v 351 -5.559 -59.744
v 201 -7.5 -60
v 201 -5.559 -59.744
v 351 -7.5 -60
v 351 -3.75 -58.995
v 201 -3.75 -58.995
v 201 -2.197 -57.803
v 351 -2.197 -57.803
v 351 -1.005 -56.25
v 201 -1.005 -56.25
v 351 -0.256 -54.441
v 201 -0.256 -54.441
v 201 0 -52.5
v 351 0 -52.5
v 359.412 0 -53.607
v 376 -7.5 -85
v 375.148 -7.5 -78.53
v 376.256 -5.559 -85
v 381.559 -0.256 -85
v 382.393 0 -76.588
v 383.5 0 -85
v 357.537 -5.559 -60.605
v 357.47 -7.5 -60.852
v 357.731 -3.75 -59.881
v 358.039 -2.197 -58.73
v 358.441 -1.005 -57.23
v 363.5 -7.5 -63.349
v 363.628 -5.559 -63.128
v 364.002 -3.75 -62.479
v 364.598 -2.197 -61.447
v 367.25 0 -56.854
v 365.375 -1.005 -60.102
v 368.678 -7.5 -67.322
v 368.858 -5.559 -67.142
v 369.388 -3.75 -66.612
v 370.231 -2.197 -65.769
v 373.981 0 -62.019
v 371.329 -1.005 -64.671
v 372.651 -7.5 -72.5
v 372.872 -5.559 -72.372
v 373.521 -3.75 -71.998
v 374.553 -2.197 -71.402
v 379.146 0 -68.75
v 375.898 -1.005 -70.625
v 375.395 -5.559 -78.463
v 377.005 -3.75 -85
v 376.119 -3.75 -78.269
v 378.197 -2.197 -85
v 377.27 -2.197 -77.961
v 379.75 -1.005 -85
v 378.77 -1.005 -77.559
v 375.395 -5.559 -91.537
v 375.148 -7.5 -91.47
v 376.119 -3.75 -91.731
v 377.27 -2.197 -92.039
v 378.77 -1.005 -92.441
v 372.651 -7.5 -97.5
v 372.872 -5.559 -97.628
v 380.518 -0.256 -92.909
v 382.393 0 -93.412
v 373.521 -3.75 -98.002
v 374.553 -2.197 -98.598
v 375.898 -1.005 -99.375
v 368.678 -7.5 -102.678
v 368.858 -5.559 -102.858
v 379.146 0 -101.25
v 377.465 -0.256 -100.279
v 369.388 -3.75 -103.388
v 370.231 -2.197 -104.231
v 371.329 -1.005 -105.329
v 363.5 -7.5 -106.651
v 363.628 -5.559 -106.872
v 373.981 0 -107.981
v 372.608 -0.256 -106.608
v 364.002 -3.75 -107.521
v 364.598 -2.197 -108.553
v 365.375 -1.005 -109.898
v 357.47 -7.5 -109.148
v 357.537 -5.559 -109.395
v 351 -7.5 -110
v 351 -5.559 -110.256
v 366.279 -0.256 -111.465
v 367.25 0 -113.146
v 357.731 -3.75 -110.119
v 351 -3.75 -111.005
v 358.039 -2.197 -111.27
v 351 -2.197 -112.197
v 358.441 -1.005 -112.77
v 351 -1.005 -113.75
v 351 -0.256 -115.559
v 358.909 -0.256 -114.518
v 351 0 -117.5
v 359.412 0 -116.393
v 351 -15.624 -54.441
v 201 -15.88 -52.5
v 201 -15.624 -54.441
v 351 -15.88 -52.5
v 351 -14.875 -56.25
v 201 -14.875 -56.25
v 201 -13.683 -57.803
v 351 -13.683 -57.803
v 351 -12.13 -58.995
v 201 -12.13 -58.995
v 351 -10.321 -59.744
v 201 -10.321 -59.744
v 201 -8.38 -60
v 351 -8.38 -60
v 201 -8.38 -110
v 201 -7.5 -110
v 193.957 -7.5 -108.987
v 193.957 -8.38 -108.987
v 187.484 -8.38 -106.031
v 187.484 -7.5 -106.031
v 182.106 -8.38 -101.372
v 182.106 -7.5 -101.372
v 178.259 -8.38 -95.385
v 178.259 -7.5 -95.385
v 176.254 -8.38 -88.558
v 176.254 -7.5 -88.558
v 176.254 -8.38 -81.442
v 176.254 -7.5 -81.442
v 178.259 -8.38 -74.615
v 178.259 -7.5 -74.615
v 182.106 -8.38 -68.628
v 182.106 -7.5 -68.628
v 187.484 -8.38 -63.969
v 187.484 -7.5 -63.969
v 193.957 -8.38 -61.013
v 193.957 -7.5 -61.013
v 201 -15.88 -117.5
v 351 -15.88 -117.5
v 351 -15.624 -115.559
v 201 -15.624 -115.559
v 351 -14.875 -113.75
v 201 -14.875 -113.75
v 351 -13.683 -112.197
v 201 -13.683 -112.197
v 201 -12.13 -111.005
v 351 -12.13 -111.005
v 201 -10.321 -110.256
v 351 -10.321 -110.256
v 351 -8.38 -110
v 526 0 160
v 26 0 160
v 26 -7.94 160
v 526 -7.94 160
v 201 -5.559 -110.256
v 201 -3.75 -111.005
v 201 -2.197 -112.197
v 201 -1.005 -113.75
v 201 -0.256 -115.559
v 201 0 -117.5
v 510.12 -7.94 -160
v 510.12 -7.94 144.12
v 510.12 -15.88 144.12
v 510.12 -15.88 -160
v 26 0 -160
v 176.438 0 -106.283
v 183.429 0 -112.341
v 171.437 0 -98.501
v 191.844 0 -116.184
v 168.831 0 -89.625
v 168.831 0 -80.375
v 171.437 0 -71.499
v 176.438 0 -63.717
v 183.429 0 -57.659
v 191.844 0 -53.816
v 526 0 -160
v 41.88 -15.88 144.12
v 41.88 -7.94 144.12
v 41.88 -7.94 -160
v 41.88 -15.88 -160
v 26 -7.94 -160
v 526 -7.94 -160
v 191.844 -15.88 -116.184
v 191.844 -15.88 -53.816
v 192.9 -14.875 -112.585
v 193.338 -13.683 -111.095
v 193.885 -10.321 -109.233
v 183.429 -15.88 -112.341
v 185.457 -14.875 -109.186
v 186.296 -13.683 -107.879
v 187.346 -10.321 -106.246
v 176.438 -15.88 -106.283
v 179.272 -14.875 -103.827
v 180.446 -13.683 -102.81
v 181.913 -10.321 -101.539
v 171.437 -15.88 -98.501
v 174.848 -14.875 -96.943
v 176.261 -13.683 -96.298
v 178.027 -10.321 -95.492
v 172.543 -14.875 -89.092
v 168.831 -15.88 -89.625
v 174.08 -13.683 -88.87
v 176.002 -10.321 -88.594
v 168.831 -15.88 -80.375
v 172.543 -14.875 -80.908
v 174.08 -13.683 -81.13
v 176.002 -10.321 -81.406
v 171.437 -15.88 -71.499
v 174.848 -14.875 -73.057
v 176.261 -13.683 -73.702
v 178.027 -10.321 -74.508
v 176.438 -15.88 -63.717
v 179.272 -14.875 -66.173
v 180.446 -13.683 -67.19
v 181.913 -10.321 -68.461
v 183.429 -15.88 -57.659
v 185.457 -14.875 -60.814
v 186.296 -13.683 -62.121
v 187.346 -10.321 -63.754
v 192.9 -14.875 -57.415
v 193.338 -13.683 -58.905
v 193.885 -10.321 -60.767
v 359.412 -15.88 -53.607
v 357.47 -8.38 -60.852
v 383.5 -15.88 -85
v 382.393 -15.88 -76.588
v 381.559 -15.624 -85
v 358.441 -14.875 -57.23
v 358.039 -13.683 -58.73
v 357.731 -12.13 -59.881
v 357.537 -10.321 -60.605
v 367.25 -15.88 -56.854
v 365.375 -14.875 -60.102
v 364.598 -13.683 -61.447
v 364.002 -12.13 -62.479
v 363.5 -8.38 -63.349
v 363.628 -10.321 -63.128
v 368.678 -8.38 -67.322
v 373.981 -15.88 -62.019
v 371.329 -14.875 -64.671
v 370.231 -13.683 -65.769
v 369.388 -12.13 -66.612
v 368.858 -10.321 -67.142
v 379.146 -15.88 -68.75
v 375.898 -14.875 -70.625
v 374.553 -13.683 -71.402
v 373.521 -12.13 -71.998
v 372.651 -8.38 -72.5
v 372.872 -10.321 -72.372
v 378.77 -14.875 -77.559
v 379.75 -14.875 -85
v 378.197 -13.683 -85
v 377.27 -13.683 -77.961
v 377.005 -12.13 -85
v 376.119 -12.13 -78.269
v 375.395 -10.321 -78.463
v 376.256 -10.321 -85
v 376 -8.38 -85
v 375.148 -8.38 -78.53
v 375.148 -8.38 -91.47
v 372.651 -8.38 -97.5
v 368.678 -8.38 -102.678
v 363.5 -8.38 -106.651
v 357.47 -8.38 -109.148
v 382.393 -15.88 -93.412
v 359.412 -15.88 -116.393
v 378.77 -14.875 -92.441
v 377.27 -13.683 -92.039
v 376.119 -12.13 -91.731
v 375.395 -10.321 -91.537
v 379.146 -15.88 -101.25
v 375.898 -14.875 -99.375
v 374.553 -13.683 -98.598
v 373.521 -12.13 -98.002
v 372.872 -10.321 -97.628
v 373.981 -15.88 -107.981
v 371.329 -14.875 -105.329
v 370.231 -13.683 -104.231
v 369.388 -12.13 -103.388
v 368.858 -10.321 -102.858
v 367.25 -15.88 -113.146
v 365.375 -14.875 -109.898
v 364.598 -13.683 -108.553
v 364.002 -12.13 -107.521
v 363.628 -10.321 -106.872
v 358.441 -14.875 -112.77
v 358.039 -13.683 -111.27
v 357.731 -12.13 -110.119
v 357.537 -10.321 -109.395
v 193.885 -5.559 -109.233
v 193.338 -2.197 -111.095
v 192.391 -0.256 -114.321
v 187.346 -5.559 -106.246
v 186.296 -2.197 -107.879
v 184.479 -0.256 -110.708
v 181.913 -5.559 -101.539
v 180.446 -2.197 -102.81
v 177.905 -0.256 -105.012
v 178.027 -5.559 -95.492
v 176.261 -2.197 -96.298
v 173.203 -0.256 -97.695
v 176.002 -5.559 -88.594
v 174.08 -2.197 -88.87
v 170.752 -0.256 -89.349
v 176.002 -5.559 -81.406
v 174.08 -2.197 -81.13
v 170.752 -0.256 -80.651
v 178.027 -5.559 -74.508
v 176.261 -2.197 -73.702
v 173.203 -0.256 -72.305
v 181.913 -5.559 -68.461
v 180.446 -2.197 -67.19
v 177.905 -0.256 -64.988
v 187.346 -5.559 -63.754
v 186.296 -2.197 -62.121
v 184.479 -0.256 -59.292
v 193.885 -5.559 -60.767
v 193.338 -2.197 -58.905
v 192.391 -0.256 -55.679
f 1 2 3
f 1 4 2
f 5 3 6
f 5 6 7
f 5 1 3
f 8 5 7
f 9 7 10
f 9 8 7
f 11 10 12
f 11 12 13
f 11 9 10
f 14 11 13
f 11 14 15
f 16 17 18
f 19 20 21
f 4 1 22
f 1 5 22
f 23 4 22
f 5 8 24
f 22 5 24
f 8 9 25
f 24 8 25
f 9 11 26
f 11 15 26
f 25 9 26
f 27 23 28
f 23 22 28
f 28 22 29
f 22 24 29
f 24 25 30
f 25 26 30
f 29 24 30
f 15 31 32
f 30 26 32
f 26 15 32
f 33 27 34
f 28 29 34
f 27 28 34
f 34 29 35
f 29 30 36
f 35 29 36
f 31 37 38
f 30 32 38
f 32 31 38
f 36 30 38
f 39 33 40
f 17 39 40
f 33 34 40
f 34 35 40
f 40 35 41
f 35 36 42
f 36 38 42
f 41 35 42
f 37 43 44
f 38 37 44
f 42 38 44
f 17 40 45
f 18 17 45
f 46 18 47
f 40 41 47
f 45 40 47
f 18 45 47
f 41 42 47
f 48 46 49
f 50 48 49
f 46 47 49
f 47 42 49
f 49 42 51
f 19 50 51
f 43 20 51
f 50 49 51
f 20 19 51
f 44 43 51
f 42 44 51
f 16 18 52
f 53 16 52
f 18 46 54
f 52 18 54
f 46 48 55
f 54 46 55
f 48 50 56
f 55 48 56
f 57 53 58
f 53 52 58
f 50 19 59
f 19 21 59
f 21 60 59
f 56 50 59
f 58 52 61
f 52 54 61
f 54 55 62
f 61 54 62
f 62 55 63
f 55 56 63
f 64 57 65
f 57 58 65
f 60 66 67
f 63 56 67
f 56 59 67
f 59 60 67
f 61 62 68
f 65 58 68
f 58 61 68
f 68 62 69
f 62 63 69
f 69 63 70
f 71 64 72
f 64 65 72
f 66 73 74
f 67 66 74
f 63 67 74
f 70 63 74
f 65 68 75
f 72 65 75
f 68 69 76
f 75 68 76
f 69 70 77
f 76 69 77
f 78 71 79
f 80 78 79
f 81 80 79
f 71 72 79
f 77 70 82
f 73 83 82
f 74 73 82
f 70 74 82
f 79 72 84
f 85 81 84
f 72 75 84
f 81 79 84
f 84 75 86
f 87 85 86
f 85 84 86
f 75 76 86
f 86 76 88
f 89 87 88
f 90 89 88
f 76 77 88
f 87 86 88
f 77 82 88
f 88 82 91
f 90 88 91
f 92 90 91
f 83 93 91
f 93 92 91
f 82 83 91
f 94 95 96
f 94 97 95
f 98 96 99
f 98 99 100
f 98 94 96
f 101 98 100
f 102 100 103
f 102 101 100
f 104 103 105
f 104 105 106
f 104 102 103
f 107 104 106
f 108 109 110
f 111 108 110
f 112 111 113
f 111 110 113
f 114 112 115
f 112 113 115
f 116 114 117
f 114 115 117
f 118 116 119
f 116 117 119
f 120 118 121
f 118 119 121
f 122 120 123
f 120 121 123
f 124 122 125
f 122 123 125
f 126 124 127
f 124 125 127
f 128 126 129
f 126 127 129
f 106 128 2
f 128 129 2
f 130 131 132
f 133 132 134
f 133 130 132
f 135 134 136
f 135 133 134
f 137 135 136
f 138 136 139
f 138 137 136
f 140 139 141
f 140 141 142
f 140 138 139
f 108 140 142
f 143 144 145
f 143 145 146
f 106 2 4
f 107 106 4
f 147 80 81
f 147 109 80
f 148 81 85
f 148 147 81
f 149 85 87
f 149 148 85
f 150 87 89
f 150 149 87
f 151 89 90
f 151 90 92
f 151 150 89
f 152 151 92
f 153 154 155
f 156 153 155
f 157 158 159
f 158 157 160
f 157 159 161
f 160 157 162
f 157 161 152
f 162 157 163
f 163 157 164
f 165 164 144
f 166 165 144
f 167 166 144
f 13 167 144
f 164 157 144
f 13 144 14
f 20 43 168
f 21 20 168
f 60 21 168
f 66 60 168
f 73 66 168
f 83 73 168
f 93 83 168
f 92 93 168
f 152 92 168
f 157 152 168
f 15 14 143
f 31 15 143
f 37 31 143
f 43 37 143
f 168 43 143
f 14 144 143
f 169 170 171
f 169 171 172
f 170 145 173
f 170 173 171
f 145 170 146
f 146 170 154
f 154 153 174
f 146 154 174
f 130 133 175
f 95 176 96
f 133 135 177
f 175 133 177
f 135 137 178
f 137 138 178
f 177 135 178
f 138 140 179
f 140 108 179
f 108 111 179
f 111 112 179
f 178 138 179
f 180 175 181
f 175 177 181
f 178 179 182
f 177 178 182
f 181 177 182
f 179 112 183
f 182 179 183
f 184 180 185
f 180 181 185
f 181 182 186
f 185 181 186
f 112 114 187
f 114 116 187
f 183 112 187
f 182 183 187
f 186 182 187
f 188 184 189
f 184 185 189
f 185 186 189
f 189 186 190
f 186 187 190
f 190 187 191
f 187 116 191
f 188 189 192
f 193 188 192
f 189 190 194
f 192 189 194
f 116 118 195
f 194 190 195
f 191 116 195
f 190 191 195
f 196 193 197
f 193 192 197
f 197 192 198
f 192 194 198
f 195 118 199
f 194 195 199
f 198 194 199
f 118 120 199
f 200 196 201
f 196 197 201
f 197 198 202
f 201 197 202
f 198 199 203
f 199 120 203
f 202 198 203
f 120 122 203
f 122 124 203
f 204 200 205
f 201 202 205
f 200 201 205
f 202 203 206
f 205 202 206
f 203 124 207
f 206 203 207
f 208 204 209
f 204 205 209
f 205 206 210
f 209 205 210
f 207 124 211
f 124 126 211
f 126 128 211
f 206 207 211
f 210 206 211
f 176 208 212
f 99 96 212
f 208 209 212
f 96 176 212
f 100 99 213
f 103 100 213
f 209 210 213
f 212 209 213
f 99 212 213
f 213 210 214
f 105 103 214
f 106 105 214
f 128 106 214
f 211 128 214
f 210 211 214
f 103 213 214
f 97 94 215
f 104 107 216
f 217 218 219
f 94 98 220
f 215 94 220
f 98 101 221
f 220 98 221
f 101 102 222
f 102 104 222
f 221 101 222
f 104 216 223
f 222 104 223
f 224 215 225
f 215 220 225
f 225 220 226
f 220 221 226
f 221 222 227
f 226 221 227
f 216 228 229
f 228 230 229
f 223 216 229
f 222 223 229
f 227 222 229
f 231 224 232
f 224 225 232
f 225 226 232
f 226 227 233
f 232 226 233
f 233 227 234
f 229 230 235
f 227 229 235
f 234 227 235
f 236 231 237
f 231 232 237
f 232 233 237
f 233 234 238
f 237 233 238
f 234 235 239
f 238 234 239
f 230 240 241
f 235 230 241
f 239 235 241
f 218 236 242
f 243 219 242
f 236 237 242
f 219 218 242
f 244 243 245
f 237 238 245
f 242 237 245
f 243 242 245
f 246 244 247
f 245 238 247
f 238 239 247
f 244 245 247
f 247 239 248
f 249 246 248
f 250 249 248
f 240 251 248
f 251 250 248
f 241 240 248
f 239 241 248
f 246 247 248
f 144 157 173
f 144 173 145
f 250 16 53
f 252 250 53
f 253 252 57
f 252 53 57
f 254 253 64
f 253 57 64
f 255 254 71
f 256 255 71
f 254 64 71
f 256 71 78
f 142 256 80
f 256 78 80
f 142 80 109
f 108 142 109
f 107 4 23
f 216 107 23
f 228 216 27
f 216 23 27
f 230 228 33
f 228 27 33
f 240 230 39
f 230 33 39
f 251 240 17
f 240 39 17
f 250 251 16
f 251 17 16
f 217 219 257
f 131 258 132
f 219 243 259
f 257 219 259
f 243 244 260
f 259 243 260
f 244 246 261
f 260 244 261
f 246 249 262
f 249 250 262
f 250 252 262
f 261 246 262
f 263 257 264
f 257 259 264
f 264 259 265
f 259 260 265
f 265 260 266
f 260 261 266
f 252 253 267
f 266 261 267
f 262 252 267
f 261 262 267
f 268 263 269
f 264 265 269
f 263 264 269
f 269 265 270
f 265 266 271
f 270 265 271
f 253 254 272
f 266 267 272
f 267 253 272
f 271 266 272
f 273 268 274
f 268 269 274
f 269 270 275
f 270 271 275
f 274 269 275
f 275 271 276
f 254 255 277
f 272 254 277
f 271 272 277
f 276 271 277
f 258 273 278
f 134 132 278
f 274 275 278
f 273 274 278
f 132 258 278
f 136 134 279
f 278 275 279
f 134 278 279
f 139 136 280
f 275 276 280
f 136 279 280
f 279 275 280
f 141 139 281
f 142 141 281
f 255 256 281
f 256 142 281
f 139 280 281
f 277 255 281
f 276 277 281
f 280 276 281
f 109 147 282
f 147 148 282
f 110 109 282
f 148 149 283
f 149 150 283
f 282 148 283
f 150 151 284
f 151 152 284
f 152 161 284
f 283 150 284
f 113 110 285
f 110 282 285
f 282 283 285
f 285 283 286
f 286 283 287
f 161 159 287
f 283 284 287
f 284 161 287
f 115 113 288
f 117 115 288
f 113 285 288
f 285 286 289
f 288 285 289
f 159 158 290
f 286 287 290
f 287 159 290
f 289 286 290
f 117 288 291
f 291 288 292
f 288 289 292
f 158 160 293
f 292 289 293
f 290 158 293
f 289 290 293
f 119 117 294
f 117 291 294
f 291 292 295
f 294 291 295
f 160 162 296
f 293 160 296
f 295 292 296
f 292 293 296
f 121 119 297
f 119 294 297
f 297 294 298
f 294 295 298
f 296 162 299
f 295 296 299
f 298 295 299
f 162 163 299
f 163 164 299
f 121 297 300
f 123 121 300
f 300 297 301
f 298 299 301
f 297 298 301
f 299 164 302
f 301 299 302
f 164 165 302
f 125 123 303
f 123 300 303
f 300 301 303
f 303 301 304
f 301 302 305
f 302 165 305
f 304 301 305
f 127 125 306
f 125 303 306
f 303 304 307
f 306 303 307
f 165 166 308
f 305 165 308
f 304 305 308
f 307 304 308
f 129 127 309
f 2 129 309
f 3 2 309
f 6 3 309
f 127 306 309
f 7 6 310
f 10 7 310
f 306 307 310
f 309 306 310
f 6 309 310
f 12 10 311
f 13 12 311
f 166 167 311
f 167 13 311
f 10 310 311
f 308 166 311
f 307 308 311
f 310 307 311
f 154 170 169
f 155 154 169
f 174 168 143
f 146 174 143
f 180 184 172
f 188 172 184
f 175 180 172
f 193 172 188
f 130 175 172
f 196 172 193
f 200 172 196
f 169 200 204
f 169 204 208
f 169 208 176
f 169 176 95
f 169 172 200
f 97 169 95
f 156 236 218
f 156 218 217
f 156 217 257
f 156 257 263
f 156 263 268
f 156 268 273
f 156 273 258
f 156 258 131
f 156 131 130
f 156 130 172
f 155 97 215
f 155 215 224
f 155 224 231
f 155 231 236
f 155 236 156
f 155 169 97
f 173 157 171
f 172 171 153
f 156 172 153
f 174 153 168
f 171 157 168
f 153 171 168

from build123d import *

# Parameters (mm, degrees)
F0_W     = 500
F0_H     = 320
F1_DEPTH = 15.88
F2_W     = 15.88
F2_H     = 7.94
F3_DEPTH = 320.001
F4_W     = 7.94
F4_H     = 15.88
F5_DEPTH = 484.121
F6_R     = 7.5


with BuildPart() as f1:
    # F0 (on Front) → F1 (new body)
    with BuildSketch(Plane.XZ):
        with Locations((276.000002, -4e-06)):
            Rectangle(F0_W, F0_H)
        with BuildLine():
            ThreePointArc((376.000002, -85.000004), (368.677672, -102.677673), (351.000002, -110.000004))
            Line((351.000002, -110.000004), (201.000002, -110.000004))
            ThreePointArc((201.000002, -110.000004), (176.000002, -85.000004), (201.000002, -60.000004))
            Line((201.000002, -60.000004), (351.000002, -60.000004))
            ThreePointArc((351.000002, -60.000004), (368.677672, -67.322334), (376.000002, -85.000004))
        make_face(mode=Mode.SUBTRACT)
    extrude(amount=F1_DEPTH)

    # F2 (on face) → F3 (cut, through all)
    with BuildSketch(Plane(origin=(0, 0, -160.000004), x_dir=(1, 0, 0), z_dir=(0, 0, -1))):
        with Locations((33.940002, 11.91)):
            Rectangle(F2_W, F2_H)
        with Locations((518.060002, 11.91)):
            Rectangle(F2_W, F2_H)
    extrude(amount=-F3_DEPTH, mode=Mode.SUBTRACT)

    # F4 (on face) → F5 (cut, through all)
    with BuildSketch(Plane(origin=(41.880002, 0, 0), x_dir=(0, -1, 0), z_dir=(-1, 0, 0))):
        with Locations((11.91, 152.059996)):
            Rectangle(F4_W, F4_H)
    extrude(amount=-F5_DEPTH, mode=Mode.SUBTRACT)

    # F6
    f6_edges = [f1.edges().sort_by_distance(p)[0] for p in [
        (276.000002, 0, -60.000004),
        (276.000002, -15.88, -60.000004),
    ]]
    fillet(f6_edges, radius=F6_R)


solid = f1.part
